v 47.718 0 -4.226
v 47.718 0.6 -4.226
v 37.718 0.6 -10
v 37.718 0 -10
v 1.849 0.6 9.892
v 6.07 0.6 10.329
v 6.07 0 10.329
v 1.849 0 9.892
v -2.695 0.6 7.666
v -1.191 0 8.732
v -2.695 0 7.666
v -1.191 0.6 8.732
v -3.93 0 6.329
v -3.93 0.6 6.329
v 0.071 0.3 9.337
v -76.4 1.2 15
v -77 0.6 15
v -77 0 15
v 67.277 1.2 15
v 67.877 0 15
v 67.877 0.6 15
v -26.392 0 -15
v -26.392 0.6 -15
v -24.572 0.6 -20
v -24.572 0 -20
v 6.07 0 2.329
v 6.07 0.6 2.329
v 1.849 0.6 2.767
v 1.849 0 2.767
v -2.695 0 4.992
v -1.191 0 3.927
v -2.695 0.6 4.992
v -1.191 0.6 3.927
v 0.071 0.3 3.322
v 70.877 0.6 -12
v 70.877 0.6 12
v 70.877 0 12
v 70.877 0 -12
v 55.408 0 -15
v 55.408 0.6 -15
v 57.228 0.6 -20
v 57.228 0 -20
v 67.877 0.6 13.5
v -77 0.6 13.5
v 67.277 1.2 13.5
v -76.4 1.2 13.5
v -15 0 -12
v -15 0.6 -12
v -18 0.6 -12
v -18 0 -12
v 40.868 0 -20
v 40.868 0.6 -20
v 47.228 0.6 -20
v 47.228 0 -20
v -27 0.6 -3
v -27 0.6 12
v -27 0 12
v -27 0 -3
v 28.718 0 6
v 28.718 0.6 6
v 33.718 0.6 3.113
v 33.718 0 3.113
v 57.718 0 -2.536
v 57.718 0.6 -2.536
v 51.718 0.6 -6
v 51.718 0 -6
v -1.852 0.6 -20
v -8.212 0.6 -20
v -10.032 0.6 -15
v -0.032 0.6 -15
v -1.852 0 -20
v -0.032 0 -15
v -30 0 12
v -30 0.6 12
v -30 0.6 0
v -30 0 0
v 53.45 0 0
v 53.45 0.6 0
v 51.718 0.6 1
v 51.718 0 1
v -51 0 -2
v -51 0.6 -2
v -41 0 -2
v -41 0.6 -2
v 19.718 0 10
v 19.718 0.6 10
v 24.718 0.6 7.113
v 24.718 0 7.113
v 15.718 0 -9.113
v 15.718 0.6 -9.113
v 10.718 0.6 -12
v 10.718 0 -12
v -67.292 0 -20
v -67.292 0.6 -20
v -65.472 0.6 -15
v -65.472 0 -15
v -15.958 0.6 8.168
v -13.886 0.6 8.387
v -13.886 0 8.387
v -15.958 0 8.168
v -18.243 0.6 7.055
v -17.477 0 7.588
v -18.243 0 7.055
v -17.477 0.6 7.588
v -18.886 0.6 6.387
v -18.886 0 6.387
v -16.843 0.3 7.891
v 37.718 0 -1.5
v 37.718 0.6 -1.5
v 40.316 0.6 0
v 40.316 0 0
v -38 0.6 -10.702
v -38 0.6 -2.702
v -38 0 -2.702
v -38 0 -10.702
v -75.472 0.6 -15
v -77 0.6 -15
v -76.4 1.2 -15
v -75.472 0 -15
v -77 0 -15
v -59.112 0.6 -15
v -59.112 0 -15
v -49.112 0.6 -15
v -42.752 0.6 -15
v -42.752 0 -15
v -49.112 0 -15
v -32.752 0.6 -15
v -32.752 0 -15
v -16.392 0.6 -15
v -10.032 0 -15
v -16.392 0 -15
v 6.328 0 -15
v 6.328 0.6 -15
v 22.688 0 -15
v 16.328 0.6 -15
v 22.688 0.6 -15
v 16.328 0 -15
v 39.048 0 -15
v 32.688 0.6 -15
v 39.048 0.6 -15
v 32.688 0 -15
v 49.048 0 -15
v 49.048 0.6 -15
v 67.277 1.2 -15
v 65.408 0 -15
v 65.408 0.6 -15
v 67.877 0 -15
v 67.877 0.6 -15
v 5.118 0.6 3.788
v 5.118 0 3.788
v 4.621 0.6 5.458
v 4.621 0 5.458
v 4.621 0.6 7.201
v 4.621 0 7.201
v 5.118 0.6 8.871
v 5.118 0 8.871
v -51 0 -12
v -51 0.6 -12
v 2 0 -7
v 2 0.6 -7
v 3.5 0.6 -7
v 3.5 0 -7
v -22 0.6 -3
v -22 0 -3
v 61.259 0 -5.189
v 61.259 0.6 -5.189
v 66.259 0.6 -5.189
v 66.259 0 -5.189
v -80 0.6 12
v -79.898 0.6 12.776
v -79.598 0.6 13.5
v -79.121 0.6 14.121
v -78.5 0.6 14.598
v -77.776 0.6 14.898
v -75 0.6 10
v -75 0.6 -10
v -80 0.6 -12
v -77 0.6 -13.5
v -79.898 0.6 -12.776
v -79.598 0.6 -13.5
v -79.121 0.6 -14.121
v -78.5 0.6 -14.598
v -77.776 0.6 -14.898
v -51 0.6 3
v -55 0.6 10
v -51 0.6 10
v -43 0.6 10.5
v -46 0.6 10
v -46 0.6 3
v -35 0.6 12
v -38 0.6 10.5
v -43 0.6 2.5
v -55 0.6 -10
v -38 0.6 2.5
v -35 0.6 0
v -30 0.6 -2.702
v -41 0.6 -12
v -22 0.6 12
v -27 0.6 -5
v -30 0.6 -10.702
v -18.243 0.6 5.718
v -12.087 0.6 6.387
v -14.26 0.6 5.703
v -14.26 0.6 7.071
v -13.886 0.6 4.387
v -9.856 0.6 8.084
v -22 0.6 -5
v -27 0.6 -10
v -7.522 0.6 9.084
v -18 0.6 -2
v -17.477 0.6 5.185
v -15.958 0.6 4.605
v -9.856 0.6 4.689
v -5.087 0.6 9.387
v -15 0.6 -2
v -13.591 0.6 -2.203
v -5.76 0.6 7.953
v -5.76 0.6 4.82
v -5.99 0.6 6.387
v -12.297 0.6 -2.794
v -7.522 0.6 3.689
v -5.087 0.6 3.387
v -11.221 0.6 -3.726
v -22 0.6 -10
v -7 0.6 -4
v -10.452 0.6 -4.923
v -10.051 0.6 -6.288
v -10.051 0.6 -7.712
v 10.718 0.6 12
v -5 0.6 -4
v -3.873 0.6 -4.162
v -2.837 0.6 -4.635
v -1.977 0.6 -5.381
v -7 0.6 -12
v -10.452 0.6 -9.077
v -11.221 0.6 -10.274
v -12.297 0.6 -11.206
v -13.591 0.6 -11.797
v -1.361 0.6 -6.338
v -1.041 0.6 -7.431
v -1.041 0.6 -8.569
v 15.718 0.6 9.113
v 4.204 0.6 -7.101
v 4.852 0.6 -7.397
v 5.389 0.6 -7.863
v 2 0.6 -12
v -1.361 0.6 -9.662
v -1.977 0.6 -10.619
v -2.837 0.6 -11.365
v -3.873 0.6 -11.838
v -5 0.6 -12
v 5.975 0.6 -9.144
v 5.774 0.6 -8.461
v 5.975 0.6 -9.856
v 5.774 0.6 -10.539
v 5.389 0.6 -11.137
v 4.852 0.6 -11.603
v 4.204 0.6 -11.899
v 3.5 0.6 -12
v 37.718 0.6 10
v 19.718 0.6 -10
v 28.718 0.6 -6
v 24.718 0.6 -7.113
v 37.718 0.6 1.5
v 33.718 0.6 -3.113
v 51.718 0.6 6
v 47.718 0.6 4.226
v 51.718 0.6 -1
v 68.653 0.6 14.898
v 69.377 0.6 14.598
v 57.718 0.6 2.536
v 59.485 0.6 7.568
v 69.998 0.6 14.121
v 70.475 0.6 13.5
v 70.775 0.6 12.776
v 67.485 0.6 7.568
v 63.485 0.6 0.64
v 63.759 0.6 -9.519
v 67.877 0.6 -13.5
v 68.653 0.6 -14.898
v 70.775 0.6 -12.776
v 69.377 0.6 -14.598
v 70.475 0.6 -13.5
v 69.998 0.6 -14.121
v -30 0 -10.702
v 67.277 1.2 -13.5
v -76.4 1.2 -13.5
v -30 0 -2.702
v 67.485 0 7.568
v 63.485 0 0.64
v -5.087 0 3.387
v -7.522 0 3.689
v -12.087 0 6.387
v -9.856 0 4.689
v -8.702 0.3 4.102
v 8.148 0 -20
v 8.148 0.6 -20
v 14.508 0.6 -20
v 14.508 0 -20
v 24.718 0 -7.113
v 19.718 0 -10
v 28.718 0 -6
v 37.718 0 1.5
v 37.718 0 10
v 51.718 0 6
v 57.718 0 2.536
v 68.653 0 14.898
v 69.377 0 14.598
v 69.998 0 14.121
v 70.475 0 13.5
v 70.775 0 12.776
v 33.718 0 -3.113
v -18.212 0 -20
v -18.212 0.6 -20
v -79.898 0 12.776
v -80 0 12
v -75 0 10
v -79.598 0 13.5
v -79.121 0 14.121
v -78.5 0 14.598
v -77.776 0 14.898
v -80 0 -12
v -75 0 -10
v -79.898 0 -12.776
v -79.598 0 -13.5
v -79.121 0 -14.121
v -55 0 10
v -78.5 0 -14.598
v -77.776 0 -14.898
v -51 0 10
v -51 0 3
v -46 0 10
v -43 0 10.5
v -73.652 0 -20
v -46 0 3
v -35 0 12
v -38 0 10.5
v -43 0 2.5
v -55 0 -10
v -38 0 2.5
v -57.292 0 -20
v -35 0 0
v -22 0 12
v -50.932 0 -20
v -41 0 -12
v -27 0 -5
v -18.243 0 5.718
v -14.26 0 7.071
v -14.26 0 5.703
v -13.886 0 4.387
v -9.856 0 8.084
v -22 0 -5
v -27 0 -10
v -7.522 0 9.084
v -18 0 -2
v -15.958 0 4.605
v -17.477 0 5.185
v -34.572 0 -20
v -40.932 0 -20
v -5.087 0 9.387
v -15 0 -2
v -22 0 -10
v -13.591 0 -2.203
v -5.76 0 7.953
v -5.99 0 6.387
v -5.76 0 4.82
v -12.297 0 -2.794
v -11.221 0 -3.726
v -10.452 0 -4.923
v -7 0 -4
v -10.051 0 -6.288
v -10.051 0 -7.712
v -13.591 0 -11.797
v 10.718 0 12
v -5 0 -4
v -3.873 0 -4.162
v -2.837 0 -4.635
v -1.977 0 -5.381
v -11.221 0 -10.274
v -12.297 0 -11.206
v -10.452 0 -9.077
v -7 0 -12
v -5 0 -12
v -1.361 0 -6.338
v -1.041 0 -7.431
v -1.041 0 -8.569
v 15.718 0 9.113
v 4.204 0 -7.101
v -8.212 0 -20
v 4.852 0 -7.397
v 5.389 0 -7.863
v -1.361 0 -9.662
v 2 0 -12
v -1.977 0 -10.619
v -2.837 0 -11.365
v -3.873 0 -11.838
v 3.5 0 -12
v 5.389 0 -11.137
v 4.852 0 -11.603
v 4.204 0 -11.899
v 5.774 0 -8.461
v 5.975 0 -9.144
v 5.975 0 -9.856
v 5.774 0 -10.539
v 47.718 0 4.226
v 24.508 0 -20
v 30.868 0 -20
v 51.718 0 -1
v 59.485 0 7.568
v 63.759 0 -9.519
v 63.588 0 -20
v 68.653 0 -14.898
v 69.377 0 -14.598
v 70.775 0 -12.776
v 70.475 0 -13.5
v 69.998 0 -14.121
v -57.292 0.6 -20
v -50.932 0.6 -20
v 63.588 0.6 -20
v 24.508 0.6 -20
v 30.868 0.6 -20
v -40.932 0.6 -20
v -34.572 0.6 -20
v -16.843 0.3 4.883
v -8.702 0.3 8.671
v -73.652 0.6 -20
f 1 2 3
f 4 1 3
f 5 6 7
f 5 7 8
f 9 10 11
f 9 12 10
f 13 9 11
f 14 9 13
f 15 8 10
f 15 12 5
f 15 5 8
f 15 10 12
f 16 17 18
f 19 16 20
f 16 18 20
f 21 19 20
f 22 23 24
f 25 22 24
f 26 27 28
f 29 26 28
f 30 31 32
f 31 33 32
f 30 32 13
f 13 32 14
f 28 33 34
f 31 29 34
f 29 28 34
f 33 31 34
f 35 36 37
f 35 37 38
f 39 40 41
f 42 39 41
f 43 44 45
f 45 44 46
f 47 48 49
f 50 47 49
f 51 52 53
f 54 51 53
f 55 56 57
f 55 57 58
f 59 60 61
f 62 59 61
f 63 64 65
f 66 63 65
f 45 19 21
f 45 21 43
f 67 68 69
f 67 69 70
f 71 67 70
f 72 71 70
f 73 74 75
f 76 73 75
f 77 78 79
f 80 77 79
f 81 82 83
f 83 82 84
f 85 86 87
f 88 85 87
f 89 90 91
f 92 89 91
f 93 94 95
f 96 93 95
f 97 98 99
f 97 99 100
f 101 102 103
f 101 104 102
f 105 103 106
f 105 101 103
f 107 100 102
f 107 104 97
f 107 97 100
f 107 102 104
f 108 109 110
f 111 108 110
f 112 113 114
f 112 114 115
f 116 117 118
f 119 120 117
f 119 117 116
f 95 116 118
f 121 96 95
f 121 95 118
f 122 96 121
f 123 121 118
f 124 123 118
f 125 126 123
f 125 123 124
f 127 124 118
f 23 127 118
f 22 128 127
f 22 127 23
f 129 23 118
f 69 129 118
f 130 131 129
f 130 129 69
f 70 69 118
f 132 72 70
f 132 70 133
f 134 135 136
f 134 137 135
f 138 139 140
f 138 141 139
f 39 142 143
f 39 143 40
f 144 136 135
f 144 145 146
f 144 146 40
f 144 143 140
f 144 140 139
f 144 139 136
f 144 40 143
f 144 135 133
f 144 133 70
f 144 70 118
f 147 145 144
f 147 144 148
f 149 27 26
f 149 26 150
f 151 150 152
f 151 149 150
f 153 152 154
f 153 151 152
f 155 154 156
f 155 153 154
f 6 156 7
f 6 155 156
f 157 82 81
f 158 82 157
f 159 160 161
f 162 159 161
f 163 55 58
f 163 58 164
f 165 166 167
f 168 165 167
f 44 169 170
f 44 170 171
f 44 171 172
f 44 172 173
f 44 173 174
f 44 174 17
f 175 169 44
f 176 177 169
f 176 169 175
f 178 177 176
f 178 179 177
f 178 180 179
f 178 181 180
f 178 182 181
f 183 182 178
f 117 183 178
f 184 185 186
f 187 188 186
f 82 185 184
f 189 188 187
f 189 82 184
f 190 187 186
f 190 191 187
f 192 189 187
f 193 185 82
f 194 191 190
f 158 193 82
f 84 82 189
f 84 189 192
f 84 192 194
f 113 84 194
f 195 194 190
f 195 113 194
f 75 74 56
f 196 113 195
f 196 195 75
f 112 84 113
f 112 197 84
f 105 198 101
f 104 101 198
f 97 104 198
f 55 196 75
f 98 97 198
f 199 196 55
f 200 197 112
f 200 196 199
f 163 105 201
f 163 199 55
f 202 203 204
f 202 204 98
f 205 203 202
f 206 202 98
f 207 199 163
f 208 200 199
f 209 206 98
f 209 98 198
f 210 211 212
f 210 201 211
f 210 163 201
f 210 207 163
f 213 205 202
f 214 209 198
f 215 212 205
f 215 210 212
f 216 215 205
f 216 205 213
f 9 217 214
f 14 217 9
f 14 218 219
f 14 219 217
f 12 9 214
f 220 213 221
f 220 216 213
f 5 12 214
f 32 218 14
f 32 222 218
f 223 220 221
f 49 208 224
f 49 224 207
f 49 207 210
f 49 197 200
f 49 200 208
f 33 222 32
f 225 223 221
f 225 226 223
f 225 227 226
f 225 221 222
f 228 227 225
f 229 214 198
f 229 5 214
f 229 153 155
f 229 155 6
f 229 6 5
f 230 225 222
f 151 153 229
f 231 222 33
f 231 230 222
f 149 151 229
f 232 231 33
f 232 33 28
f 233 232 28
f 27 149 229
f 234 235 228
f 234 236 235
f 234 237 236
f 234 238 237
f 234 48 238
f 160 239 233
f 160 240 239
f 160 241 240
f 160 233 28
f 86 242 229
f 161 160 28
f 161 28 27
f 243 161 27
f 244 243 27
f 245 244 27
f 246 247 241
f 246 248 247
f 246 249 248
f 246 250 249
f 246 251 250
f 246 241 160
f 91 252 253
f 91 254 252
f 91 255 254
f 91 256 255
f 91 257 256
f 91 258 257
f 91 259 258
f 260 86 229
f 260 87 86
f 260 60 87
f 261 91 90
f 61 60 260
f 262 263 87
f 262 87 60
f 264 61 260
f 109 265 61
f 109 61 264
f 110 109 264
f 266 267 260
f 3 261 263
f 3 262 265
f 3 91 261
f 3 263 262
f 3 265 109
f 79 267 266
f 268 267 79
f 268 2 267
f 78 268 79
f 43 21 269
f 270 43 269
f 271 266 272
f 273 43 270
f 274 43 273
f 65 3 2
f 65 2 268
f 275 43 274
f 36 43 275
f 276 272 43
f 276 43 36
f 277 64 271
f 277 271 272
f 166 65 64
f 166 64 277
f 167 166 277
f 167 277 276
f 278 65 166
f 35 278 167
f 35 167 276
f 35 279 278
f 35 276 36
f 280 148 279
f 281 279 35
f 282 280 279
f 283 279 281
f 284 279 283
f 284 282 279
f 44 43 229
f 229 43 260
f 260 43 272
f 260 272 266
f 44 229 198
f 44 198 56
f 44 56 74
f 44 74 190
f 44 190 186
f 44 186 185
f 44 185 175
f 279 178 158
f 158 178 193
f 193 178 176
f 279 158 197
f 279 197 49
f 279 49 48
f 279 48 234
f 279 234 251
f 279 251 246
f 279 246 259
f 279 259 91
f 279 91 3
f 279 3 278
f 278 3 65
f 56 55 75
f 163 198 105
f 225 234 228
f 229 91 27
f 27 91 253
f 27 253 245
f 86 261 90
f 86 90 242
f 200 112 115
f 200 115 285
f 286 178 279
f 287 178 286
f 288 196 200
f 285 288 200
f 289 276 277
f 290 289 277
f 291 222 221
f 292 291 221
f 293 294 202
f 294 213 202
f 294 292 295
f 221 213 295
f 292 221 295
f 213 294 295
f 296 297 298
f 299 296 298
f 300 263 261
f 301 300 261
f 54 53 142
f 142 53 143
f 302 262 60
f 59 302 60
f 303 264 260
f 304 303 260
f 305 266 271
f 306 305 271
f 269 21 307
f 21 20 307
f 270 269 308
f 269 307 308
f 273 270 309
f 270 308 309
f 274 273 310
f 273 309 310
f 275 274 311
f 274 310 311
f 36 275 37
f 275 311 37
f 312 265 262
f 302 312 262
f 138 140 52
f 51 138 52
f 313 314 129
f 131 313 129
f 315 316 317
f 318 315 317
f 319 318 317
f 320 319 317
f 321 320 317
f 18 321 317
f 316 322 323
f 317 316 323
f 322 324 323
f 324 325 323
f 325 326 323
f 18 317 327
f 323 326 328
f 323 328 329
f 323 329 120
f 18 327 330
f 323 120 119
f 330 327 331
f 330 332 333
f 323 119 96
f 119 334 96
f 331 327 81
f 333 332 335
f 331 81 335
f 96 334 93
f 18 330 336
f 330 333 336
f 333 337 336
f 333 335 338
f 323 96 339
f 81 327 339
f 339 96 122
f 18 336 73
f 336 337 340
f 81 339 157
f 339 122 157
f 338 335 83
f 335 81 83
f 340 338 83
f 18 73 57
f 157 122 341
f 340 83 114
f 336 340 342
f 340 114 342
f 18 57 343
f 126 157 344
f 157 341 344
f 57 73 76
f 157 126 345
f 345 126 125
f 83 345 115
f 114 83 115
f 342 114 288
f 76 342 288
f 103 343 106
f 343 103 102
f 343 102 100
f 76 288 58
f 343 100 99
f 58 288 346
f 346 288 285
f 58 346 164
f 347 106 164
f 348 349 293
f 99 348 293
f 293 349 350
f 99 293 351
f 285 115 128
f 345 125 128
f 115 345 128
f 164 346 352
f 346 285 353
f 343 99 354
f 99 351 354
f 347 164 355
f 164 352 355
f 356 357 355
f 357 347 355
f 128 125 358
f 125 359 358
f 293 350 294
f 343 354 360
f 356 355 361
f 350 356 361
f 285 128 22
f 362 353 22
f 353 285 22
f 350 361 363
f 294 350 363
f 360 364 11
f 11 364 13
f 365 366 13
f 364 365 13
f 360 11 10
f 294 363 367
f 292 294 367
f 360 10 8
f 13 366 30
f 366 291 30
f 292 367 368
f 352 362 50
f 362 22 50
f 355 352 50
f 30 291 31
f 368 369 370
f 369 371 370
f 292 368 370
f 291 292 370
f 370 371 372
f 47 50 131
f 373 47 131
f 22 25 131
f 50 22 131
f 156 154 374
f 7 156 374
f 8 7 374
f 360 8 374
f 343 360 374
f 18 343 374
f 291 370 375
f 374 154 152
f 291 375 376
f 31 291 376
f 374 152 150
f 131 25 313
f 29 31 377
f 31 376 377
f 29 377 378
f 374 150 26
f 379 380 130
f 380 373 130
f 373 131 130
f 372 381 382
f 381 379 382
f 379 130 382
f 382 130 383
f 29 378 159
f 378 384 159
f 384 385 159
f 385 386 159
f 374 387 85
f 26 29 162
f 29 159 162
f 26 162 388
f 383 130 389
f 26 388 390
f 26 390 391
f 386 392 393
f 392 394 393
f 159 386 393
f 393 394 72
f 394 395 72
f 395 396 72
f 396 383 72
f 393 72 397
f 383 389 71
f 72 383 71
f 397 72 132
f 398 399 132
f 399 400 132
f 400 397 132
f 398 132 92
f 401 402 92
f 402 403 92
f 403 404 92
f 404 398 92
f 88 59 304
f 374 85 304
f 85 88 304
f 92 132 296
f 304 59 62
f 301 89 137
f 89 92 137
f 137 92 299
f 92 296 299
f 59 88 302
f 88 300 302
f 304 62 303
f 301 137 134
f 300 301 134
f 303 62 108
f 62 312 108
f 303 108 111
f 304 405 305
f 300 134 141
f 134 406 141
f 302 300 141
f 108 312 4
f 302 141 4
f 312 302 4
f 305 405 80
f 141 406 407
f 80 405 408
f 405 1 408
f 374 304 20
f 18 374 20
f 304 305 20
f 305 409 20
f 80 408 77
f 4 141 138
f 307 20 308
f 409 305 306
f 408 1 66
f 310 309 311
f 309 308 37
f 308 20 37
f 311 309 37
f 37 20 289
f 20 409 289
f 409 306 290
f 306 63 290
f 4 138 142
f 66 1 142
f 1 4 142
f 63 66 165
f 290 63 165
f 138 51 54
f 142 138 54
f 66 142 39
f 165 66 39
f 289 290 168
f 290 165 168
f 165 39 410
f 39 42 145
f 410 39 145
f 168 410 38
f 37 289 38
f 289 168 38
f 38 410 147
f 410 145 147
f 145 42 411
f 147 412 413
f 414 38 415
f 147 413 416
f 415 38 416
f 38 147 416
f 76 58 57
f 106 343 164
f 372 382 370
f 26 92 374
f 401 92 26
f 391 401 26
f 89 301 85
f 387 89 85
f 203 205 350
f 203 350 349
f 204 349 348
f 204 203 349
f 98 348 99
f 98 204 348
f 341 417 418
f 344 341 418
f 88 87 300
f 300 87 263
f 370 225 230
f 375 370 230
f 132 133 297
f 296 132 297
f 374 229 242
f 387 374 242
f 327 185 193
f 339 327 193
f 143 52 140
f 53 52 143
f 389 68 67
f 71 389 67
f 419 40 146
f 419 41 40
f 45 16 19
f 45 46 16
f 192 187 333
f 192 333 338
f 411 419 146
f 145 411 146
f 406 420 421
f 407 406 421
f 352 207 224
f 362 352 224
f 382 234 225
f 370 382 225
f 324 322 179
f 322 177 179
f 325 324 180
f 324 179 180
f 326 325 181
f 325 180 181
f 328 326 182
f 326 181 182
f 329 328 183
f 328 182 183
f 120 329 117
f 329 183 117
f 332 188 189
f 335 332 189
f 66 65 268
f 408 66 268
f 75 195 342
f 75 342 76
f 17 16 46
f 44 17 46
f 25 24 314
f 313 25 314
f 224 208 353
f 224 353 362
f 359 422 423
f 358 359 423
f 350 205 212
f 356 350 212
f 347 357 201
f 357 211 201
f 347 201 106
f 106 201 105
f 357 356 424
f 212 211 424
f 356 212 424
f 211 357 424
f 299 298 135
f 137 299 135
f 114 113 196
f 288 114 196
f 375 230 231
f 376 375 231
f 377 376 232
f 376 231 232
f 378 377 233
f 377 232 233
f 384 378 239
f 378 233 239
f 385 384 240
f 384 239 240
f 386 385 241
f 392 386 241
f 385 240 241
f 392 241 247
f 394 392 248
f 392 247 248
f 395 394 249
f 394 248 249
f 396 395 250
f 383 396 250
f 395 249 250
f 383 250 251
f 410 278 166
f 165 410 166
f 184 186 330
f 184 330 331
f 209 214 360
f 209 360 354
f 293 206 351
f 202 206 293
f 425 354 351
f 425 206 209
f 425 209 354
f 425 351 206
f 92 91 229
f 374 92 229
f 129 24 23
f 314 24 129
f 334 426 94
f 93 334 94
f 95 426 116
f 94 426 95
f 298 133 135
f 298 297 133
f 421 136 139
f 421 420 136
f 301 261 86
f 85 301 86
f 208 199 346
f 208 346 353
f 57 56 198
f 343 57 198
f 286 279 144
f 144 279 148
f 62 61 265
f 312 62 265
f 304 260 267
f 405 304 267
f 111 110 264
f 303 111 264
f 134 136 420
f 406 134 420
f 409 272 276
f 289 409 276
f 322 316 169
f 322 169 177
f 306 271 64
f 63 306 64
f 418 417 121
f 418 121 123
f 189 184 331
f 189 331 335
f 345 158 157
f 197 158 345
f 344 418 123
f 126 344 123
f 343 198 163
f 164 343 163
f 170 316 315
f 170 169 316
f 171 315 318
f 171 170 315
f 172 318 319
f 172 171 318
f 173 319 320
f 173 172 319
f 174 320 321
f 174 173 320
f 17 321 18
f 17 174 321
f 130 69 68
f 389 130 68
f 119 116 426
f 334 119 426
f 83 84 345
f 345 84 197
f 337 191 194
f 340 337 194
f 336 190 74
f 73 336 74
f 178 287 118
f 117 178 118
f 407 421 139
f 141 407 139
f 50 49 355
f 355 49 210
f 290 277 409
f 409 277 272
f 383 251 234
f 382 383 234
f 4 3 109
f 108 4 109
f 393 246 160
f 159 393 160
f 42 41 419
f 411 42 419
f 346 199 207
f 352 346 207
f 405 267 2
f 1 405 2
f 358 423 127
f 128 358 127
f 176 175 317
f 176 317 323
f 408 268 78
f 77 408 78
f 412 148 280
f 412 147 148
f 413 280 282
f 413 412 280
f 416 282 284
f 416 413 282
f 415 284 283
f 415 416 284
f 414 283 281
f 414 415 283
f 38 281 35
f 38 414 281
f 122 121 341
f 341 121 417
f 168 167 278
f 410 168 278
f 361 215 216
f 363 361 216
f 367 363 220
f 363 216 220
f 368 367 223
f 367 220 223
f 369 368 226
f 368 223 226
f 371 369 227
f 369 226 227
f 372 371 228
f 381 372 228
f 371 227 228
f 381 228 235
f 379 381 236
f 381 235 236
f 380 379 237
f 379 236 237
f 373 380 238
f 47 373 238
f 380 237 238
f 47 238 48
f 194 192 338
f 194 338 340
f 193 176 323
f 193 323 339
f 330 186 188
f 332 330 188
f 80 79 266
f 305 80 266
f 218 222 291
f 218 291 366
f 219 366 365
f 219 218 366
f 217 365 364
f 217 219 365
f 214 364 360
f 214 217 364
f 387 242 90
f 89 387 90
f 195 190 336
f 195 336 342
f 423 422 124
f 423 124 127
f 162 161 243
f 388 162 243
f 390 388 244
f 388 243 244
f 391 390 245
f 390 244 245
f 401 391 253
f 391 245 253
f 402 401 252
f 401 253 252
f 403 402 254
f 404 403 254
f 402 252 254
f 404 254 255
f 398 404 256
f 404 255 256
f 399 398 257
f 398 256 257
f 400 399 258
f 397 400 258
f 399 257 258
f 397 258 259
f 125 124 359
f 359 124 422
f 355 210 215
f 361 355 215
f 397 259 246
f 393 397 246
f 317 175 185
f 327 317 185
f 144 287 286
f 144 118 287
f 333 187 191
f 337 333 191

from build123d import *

# Parameters (mm, degrees)
SKETCH1_W             = 160
SKETCH1_H             = 30
BOSS_EXTRUDE1_DEPTH   = 0.6
SKETCH2_W             = 20
SKETCH2_H             = 20
SKETCH2_W_2           = 10
SKETCH2_H_2           = 10
SKETCH2_W_3           = 8
SKETCH2_H_3           = 8
SKETCH2_W_4           = 5
SKETCH2_H_4           = 5
SKETCH2_H_5           = 7
SKETCH2_H_6           = 12
SKETCH2_H_7           = 15
CUT_EXTRUDE1_DEPTH    = 0.6
CUT_EXTRUDE3_DEPTH    = 0.6
CUT_EXTRUDE4_DEPTH    = 0.6
CUT_EXTRUDE5_DEPTH    = 0.6
SKETCH7_W             = 9.123147958
SKETCH7_H             = 30
CUT_EXTRUDE6_DEPTH    = 0.6
BOSS_EXTRUDE2_DEPTH   = 0.6
BOSS_EXTRUDE2_2_DEPTH = 0.6
BOSS_EXTRUDE2_3_DEPTH = 0.6
BOSS_EXTRUDE2_4_DEPTH = 0.6
BOSS_EXTRUDE2_5_DEPTH = 0.6
BOSS_EXTRUDE2_6_DEPTH = 0.6
BOSS_EXTRUDE2_7_DEPTH = 0.6
BOSS_EXTRUDE2_8_DEPTH = 0.6
BOSS_EXTRUDE2_9_DEPTH = 0.6
FILLET1_R             = 3
SKETCH9_W             = 144.876852042
SKETCH9_H             = 1.5
BOSS_EXTRUDE3_DEPTH   = 0.6
CHAMFER1_SIZE         = 0.6


with BuildPart() as part:
    # Sketch1 → Boss-Extrude1 (new body)
    with BuildSketch(Plane(origin=(0, 0, 0), x_dir=(1, 0, 0), z_dir=(0, 1, 0))):
        Rectangle(SKETCH1_W, SKETCH1_H)
    extrude(amount=BOSS_EXTRUDE1_DEPTH)

    # Sketch2 → Cut-Extrude1 (cut)
    with BuildSketch(Plane(origin=(0, 0.6, 0), x_dir=(1, 0, 0), z_dir=(0, 1, 0))):
        with Locations((-65, 0)):
            Rectangle(SKETCH2_W, SKETCH2_H)
        with BuildLine():
            Line((-5, 12), (-7, 12))
            Line((-7, 12), (-7, 4))
            Line((-7, 4), (-5, 4))
            ThreePointArc((-5, 4), (-1, 8), (-5, 12))
        make_face()
        with Locations((-46, 7)):
            Rectangle(SKETCH2_W_2, SKETCH2_H_2)
        with Locations((-34, 6.702147352)):
            Rectangle(SKETCH2_W_3, SKETCH2_H_3)
        with Locations((-24.5, 7.5)):
            Rectangle(SKETCH2_W_4, SKETCH2_H_4)
        with Locations((-48.5, -6.5)):
            Rectangle(SKETCH2_W_4, SKETCH2_H_5)
        with BuildLine():
            Line((-15, 12), (-18, 12))
            Line((-18, 12), (-18, 2))
            Line((-18, 2), (-15, 2))
            ThreePointArc((-15, 2), (-10, 7), (-15, 12))
        make_face()
        with Locations((-40.5, -6.5)):
            Rectangle(SKETCH2_W_4, SKETCH2_H_3)
        with Locations((-32.5, -6)):
            Rectangle(SKETCH2_W_4, SKETCH2_H_6)
        with Locations((-24.5, -4.5)):
            Rectangle(SKETCH2_W_4, SKETCH2_H_7)
        with BuildLine():
            Line((3.5, 12), (2, 12))
            Line((2, 12), (2, 7))
            Line((2, 7), (3.5, 7))
            ThreePointArc((3.5, 7), (6, 9.5), (3.5, 12))
        make_face()
        with BuildLine():
            ThreePointArc((6.07040459, -2.329353078), (4.557646776, -6.329353078), (6.07040459, -10.329353078))
            add(Edge.make_bspline(
                [(6.07040459, -10.329353078), (-0.928342944, -10.345027892), (-3.92959541, -6.329353078)],
                knots=[0, 0, 0, 1, 1, 1], degree=2))
            add(Edge.make_bspline(
                [(6.07040459, -2.329353078), (-0.928342944, -2.313678264), (-3.92959541, -6.329353078)],
                knots=[0, 0, 0, 1, 1, 1], degree=2))
        make_face()
        with BuildLine():
            ThreePointArc((-5.087434715, -3.386719861), (-5.990420234, -6.386719861), (-5.087434715, -9.386719861))
            add(Edge.make_bspline(
                [(-5.087434715, -9.386719861), (-8.816275614, -9.455842755), (-12.087434715, -6.386719861)],
                knots=[0, 0, 0, 1, 1, 1], degree=2))
            add(Edge.make_bspline(
                [(-5.087434715, -3.386719861), (-8.816275614, -3.317596967), (-12.087434715, -6.386719861)],
                knots=[0, 0, 0, 1, 1, 1], degree=2))
        make_face()
        with BuildLine():
            ThreePointArc((-13.885876864, -4.386719861), (-14.307566838, -6.386719861), (-13.885876864, -8.386719861))
            add(Edge.make_bspline(
                [(-13.885876864, -8.386719861), (-17.299200456, -8.394557268), (-18.885876864, -6.386719861)],
                knots=[0, 0, 0, 1, 1, 1], degree=2))
            add(Edge.make_bspline(
                [(-13.885876864, -4.386719861), (-17.299200456, -4.378882454), (-18.885876864, -6.386719861)],
                knots=[0, 0, 0, 1, 1, 1], degree=2))
        make_face()
    extrude(amount=-CUT_EXTRUDE1_DEPTH, mode=Mode.SUBTRACT)

    # Sketch3 → Cut-Extrude3 (cut)
    with BuildSketch(Plane(origin=(0, 0.6, 0), x_dir=(1, 0, 0), z_dir=(0, 1, 0))):
        Polygon((10.717645067, 12), (10.717645067, -12), (15.717645067, -9.113248654), (15.717645067, 9.113248654), align=None)
        Polygon((19.717645067, 10), (19.717645067, -10), (24.717645067, -7.113248654), (24.717645067, 7.113248654), align=None)
        Polygon((28.717645067, 6), (28.717645067, -6), (33.717645067, -3.113248654), (33.717645067, 3.113248654), align=None)
    extrude(amount=-CUT_EXTRUDE3_DEPTH, mode=Mode.SUBTRACT)

    # Sketch5 → Cut-Extrude4 (cut)
    with BuildSketch(Plane(origin=(0, 0.6, 0), x_dir=(1, 0, 0), z_dir=(0, 1, 0))):
        Polygon((37.717645067, 10), (37.717645067, 1.5), (40.315721279, 0), (37.717645067, -1.5), (37.717645067, -10), (47.717645067, -4.226497308), (47.717645067, 4.226497308), align=None)
        Polygon((51.717645067, 6), (51.717645067, 1), (53.449695875, 0), (51.717645067, -1), (51.717645067, -6), (57.717645067, -2.535898385), (57.717645067, 2.535898385), align=None)
    extrude(amount=-CUT_EXTRUDE4_DEPTH, mode=Mode.SUBTRACT)

    # Sketch6 → Cut-Extrude5 (cut)
    with BuildSketch(Plane(origin=(0, 0.6, 0), x_dir=(1, 0, 0), z_dir=(0, 1, 0))):
        Polygon((63.758994289, 9.519130037), (61.258994289, 5.189003018), (66.258994289, 5.189003018), align=None)
        Polygon((63.484953651, -0.639697818), (59.484953651, -7.567901048), (67.484953651, -7.567901048), align=None)
    extrude(amount=-CUT_EXTRUDE5_DEPTH, mode=Mode.SUBTRACT)

    # Sketch7 → Cut-Extrude6 (cut)
    with BuildSketch(Plane(origin=(0, 0.6, 0), x_dir=(1, 0, 0), z_dir=(0, 1, 0))):
        with Locations((75.438426021, 0)):
            Rectangle(SKETCH7_W, SKETCH7_H)
    extrude(amount=-CUT_EXTRUDE6_DEPTH, mode=Mode.SUBTRACT)

    # Fillet1
    fillet1_edges = [part.edges().sort_by_distance(p)[0] for p in [
        (70.876852042, 0.3, 15),
        (70.876852042, 0.3, -15),
        (-80, 0.3, 15),
        (-80, 0.3, -15),
    ]]
    fillet(fillet1_edges, radius=FILLET1_R)



with BuildPart() as body_2:
    # Sketch8 → Boss-Extrude2 (new body)
    with BuildSketch(Plane(origin=(0, 0.6, 0), x_dir=(1, 0, 0), z_dir=(0, 1, 0))):
        Polygon((-75.472294668, 15), (-73.652443497, 20), (-67.292145839, 20), (-65.472294668, 15), align=None)
    extrude(amount=-BOSS_EXTRUDE2_DEPTH)


with BuildPart() as body_3:
    # Sketch8 → Boss-Extrude2 2 (new body)
    with BuildSketch(Plane(origin=(0, 0.6, 0), x_dir=(1, 0, 0), z_dir=(0, 1, 0))):
        Polygon((-59.112294668, 15), (-57.292443497, 20), (-50.932145839, 20), (-49.112294668, 15), align=None)
    extrude(amount=-BOSS_EXTRUDE2_2_DEPTH)


with BuildPart() as body_4:
    # Sketch8 → Boss-Extrude2 3 (new body)
    with BuildSketch(Plane(origin=(0, 0.6, 0), x_dir=(1, 0, 0), z_dir=(0, 1, 0))):
        Polygon((-42.752294668, 15), (-40.932443497, 20), (-34.572145839, 20), (-32.752294668, 15), align=None)
    extrude(amount=-BOSS_EXTRUDE2_3_DEPTH)


with BuildPart() as body_5:
    # Sketch8 → Boss-Extrude2 4 (new body)
    with BuildSketch(Plane(origin=(0, 0.6, 0), x_dir=(1, 0, 0), z_dir=(0, 1, 0))):
        Polygon((-26.392294668, 15), (-24.572443497, 20), (-18.212145839, 20), (-16.392294668, 15), align=None)
    extrude(amount=-BOSS_EXTRUDE2_4_DEPTH)


with BuildPart() as body_6:
    # Sketch8 → Boss-Extrude2 5 (new body)
    with BuildSketch(Plane(origin=(0, 0.6, 0), x_dir=(1, 0, 0), z_dir=(0, 1, 0))):
        Polygon((-10.032294668, 15), (-8.212443497, 20), (-1.852145839, 20), (-0.032294668, 15), align=None)
    extrude(amount=-BOSS_EXTRUDE2_5_DEPTH)


with BuildPart() as body_7:
    # Sketch8 → Boss-Extrude2 6 (new body)
    with BuildSketch(Plane(origin=(0, 0.6, 0), x_dir=(1, 0, 0), z_dir=(0, 1, 0))):
        Polygon((6.327705332, 15), (8.147556503, 20), (14.507854161, 20), (16.327705332, 15), align=None)
    extrude(amount=-BOSS_EXTRUDE2_6_DEPTH)


with BuildPart() as body_8:
    # Sketch8 → Boss-Extrude2 7 (new body)
    with BuildSketch(Plane(origin=(0, 0.6, 0), x_dir=(1, 0, 0), z_dir=(0, 1, 0))):
        Polygon((22.687705332, 15), (24.507556503, 20), (30.867854161, 20), (32.687705332, 15), align=None)
    extrude(amount=-BOSS_EXTRUDE2_7_DEPTH)


with BuildPart() as body_9:
    # Sketch8 → Boss-Extrude2 8 (new body)
    with BuildSketch(Plane(origin=(0, 0.6, 0), x_dir=(1, 0, 0), z_dir=(0, 1, 0))):
        Polygon((39.047705332, 15), (40.867556503, 20), (47.227854161, 20), (49.047705332, 15), align=None)
    extrude(amount=-BOSS_EXTRUDE2_8_DEPTH)


with BuildPart() as body_10:
    # Sketch8 → Boss-Extrude2 9 (new body)
    with BuildSketch(Plane(origin=(0, 0.6, 0), x_dir=(1, 0, 0), z_dir=(0, 1, 0))):
        Polygon((55.407705332, 15), (57.227556503, 20), (63.587854161, 20), (65.407705332, 15), align=None)
    extrude(amount=-BOSS_EXTRUDE2_9_DEPTH)


with BuildPart() as part_1:
    add(part.part)

    add(body_2.part)  # Boss-Extrude3 merges body 2

    add(body_3.part)  # Boss-Extrude3 merges body 3

    add(body_4.part)  # Boss-Extrude3 merges body 4

    add(body_5.part)  # Boss-Extrude3 merges body 5

    add(body_6.part)  # Boss-Extrude3 merges body 6

    add(body_7.part)  # Boss-Extrude3 merges body 7

    add(body_8.part)  # Boss-Extrude3 merges body 8

    add(body_9.part)  # Boss-Extrude3 merges body 9

    add(body_10.part)  # Boss-Extrude3 merges body 10
    # Sketch9 → Boss-Extrude3 (add)
    with BuildSketch(Plane(origin=(0, 0.6, 0), x_dir=(1, 0, 0), z_dir=(0, 1, 0))):
        with Locations((-4.561573979, 14.25)):
            Rectangle(SKETCH9_W, SKETCH9_H)
        with Locations((-4.561573979, -14.25)):
            Rectangle(SKETCH9_W, SKETCH9_H)
    extrude(amount=BOSS_EXTRUDE3_DEPTH)

    # Chamfer1
    chamfer1_edges = [part_1.edges().sort_by_distance(p)[0] for p in [
        (67.876852042, 1.2, 14.25),
        (67.876852042, 1.2, -14.25),
        (-77, 1.2, 14.25),
        (-77, 1.2, -14.25),
    ]]
    chamfer(chamfer1_edges, length=CHAMFER1_SIZE - 0.0001)  # a hair under: the kernel refuses the full size


solid = part_1.part
